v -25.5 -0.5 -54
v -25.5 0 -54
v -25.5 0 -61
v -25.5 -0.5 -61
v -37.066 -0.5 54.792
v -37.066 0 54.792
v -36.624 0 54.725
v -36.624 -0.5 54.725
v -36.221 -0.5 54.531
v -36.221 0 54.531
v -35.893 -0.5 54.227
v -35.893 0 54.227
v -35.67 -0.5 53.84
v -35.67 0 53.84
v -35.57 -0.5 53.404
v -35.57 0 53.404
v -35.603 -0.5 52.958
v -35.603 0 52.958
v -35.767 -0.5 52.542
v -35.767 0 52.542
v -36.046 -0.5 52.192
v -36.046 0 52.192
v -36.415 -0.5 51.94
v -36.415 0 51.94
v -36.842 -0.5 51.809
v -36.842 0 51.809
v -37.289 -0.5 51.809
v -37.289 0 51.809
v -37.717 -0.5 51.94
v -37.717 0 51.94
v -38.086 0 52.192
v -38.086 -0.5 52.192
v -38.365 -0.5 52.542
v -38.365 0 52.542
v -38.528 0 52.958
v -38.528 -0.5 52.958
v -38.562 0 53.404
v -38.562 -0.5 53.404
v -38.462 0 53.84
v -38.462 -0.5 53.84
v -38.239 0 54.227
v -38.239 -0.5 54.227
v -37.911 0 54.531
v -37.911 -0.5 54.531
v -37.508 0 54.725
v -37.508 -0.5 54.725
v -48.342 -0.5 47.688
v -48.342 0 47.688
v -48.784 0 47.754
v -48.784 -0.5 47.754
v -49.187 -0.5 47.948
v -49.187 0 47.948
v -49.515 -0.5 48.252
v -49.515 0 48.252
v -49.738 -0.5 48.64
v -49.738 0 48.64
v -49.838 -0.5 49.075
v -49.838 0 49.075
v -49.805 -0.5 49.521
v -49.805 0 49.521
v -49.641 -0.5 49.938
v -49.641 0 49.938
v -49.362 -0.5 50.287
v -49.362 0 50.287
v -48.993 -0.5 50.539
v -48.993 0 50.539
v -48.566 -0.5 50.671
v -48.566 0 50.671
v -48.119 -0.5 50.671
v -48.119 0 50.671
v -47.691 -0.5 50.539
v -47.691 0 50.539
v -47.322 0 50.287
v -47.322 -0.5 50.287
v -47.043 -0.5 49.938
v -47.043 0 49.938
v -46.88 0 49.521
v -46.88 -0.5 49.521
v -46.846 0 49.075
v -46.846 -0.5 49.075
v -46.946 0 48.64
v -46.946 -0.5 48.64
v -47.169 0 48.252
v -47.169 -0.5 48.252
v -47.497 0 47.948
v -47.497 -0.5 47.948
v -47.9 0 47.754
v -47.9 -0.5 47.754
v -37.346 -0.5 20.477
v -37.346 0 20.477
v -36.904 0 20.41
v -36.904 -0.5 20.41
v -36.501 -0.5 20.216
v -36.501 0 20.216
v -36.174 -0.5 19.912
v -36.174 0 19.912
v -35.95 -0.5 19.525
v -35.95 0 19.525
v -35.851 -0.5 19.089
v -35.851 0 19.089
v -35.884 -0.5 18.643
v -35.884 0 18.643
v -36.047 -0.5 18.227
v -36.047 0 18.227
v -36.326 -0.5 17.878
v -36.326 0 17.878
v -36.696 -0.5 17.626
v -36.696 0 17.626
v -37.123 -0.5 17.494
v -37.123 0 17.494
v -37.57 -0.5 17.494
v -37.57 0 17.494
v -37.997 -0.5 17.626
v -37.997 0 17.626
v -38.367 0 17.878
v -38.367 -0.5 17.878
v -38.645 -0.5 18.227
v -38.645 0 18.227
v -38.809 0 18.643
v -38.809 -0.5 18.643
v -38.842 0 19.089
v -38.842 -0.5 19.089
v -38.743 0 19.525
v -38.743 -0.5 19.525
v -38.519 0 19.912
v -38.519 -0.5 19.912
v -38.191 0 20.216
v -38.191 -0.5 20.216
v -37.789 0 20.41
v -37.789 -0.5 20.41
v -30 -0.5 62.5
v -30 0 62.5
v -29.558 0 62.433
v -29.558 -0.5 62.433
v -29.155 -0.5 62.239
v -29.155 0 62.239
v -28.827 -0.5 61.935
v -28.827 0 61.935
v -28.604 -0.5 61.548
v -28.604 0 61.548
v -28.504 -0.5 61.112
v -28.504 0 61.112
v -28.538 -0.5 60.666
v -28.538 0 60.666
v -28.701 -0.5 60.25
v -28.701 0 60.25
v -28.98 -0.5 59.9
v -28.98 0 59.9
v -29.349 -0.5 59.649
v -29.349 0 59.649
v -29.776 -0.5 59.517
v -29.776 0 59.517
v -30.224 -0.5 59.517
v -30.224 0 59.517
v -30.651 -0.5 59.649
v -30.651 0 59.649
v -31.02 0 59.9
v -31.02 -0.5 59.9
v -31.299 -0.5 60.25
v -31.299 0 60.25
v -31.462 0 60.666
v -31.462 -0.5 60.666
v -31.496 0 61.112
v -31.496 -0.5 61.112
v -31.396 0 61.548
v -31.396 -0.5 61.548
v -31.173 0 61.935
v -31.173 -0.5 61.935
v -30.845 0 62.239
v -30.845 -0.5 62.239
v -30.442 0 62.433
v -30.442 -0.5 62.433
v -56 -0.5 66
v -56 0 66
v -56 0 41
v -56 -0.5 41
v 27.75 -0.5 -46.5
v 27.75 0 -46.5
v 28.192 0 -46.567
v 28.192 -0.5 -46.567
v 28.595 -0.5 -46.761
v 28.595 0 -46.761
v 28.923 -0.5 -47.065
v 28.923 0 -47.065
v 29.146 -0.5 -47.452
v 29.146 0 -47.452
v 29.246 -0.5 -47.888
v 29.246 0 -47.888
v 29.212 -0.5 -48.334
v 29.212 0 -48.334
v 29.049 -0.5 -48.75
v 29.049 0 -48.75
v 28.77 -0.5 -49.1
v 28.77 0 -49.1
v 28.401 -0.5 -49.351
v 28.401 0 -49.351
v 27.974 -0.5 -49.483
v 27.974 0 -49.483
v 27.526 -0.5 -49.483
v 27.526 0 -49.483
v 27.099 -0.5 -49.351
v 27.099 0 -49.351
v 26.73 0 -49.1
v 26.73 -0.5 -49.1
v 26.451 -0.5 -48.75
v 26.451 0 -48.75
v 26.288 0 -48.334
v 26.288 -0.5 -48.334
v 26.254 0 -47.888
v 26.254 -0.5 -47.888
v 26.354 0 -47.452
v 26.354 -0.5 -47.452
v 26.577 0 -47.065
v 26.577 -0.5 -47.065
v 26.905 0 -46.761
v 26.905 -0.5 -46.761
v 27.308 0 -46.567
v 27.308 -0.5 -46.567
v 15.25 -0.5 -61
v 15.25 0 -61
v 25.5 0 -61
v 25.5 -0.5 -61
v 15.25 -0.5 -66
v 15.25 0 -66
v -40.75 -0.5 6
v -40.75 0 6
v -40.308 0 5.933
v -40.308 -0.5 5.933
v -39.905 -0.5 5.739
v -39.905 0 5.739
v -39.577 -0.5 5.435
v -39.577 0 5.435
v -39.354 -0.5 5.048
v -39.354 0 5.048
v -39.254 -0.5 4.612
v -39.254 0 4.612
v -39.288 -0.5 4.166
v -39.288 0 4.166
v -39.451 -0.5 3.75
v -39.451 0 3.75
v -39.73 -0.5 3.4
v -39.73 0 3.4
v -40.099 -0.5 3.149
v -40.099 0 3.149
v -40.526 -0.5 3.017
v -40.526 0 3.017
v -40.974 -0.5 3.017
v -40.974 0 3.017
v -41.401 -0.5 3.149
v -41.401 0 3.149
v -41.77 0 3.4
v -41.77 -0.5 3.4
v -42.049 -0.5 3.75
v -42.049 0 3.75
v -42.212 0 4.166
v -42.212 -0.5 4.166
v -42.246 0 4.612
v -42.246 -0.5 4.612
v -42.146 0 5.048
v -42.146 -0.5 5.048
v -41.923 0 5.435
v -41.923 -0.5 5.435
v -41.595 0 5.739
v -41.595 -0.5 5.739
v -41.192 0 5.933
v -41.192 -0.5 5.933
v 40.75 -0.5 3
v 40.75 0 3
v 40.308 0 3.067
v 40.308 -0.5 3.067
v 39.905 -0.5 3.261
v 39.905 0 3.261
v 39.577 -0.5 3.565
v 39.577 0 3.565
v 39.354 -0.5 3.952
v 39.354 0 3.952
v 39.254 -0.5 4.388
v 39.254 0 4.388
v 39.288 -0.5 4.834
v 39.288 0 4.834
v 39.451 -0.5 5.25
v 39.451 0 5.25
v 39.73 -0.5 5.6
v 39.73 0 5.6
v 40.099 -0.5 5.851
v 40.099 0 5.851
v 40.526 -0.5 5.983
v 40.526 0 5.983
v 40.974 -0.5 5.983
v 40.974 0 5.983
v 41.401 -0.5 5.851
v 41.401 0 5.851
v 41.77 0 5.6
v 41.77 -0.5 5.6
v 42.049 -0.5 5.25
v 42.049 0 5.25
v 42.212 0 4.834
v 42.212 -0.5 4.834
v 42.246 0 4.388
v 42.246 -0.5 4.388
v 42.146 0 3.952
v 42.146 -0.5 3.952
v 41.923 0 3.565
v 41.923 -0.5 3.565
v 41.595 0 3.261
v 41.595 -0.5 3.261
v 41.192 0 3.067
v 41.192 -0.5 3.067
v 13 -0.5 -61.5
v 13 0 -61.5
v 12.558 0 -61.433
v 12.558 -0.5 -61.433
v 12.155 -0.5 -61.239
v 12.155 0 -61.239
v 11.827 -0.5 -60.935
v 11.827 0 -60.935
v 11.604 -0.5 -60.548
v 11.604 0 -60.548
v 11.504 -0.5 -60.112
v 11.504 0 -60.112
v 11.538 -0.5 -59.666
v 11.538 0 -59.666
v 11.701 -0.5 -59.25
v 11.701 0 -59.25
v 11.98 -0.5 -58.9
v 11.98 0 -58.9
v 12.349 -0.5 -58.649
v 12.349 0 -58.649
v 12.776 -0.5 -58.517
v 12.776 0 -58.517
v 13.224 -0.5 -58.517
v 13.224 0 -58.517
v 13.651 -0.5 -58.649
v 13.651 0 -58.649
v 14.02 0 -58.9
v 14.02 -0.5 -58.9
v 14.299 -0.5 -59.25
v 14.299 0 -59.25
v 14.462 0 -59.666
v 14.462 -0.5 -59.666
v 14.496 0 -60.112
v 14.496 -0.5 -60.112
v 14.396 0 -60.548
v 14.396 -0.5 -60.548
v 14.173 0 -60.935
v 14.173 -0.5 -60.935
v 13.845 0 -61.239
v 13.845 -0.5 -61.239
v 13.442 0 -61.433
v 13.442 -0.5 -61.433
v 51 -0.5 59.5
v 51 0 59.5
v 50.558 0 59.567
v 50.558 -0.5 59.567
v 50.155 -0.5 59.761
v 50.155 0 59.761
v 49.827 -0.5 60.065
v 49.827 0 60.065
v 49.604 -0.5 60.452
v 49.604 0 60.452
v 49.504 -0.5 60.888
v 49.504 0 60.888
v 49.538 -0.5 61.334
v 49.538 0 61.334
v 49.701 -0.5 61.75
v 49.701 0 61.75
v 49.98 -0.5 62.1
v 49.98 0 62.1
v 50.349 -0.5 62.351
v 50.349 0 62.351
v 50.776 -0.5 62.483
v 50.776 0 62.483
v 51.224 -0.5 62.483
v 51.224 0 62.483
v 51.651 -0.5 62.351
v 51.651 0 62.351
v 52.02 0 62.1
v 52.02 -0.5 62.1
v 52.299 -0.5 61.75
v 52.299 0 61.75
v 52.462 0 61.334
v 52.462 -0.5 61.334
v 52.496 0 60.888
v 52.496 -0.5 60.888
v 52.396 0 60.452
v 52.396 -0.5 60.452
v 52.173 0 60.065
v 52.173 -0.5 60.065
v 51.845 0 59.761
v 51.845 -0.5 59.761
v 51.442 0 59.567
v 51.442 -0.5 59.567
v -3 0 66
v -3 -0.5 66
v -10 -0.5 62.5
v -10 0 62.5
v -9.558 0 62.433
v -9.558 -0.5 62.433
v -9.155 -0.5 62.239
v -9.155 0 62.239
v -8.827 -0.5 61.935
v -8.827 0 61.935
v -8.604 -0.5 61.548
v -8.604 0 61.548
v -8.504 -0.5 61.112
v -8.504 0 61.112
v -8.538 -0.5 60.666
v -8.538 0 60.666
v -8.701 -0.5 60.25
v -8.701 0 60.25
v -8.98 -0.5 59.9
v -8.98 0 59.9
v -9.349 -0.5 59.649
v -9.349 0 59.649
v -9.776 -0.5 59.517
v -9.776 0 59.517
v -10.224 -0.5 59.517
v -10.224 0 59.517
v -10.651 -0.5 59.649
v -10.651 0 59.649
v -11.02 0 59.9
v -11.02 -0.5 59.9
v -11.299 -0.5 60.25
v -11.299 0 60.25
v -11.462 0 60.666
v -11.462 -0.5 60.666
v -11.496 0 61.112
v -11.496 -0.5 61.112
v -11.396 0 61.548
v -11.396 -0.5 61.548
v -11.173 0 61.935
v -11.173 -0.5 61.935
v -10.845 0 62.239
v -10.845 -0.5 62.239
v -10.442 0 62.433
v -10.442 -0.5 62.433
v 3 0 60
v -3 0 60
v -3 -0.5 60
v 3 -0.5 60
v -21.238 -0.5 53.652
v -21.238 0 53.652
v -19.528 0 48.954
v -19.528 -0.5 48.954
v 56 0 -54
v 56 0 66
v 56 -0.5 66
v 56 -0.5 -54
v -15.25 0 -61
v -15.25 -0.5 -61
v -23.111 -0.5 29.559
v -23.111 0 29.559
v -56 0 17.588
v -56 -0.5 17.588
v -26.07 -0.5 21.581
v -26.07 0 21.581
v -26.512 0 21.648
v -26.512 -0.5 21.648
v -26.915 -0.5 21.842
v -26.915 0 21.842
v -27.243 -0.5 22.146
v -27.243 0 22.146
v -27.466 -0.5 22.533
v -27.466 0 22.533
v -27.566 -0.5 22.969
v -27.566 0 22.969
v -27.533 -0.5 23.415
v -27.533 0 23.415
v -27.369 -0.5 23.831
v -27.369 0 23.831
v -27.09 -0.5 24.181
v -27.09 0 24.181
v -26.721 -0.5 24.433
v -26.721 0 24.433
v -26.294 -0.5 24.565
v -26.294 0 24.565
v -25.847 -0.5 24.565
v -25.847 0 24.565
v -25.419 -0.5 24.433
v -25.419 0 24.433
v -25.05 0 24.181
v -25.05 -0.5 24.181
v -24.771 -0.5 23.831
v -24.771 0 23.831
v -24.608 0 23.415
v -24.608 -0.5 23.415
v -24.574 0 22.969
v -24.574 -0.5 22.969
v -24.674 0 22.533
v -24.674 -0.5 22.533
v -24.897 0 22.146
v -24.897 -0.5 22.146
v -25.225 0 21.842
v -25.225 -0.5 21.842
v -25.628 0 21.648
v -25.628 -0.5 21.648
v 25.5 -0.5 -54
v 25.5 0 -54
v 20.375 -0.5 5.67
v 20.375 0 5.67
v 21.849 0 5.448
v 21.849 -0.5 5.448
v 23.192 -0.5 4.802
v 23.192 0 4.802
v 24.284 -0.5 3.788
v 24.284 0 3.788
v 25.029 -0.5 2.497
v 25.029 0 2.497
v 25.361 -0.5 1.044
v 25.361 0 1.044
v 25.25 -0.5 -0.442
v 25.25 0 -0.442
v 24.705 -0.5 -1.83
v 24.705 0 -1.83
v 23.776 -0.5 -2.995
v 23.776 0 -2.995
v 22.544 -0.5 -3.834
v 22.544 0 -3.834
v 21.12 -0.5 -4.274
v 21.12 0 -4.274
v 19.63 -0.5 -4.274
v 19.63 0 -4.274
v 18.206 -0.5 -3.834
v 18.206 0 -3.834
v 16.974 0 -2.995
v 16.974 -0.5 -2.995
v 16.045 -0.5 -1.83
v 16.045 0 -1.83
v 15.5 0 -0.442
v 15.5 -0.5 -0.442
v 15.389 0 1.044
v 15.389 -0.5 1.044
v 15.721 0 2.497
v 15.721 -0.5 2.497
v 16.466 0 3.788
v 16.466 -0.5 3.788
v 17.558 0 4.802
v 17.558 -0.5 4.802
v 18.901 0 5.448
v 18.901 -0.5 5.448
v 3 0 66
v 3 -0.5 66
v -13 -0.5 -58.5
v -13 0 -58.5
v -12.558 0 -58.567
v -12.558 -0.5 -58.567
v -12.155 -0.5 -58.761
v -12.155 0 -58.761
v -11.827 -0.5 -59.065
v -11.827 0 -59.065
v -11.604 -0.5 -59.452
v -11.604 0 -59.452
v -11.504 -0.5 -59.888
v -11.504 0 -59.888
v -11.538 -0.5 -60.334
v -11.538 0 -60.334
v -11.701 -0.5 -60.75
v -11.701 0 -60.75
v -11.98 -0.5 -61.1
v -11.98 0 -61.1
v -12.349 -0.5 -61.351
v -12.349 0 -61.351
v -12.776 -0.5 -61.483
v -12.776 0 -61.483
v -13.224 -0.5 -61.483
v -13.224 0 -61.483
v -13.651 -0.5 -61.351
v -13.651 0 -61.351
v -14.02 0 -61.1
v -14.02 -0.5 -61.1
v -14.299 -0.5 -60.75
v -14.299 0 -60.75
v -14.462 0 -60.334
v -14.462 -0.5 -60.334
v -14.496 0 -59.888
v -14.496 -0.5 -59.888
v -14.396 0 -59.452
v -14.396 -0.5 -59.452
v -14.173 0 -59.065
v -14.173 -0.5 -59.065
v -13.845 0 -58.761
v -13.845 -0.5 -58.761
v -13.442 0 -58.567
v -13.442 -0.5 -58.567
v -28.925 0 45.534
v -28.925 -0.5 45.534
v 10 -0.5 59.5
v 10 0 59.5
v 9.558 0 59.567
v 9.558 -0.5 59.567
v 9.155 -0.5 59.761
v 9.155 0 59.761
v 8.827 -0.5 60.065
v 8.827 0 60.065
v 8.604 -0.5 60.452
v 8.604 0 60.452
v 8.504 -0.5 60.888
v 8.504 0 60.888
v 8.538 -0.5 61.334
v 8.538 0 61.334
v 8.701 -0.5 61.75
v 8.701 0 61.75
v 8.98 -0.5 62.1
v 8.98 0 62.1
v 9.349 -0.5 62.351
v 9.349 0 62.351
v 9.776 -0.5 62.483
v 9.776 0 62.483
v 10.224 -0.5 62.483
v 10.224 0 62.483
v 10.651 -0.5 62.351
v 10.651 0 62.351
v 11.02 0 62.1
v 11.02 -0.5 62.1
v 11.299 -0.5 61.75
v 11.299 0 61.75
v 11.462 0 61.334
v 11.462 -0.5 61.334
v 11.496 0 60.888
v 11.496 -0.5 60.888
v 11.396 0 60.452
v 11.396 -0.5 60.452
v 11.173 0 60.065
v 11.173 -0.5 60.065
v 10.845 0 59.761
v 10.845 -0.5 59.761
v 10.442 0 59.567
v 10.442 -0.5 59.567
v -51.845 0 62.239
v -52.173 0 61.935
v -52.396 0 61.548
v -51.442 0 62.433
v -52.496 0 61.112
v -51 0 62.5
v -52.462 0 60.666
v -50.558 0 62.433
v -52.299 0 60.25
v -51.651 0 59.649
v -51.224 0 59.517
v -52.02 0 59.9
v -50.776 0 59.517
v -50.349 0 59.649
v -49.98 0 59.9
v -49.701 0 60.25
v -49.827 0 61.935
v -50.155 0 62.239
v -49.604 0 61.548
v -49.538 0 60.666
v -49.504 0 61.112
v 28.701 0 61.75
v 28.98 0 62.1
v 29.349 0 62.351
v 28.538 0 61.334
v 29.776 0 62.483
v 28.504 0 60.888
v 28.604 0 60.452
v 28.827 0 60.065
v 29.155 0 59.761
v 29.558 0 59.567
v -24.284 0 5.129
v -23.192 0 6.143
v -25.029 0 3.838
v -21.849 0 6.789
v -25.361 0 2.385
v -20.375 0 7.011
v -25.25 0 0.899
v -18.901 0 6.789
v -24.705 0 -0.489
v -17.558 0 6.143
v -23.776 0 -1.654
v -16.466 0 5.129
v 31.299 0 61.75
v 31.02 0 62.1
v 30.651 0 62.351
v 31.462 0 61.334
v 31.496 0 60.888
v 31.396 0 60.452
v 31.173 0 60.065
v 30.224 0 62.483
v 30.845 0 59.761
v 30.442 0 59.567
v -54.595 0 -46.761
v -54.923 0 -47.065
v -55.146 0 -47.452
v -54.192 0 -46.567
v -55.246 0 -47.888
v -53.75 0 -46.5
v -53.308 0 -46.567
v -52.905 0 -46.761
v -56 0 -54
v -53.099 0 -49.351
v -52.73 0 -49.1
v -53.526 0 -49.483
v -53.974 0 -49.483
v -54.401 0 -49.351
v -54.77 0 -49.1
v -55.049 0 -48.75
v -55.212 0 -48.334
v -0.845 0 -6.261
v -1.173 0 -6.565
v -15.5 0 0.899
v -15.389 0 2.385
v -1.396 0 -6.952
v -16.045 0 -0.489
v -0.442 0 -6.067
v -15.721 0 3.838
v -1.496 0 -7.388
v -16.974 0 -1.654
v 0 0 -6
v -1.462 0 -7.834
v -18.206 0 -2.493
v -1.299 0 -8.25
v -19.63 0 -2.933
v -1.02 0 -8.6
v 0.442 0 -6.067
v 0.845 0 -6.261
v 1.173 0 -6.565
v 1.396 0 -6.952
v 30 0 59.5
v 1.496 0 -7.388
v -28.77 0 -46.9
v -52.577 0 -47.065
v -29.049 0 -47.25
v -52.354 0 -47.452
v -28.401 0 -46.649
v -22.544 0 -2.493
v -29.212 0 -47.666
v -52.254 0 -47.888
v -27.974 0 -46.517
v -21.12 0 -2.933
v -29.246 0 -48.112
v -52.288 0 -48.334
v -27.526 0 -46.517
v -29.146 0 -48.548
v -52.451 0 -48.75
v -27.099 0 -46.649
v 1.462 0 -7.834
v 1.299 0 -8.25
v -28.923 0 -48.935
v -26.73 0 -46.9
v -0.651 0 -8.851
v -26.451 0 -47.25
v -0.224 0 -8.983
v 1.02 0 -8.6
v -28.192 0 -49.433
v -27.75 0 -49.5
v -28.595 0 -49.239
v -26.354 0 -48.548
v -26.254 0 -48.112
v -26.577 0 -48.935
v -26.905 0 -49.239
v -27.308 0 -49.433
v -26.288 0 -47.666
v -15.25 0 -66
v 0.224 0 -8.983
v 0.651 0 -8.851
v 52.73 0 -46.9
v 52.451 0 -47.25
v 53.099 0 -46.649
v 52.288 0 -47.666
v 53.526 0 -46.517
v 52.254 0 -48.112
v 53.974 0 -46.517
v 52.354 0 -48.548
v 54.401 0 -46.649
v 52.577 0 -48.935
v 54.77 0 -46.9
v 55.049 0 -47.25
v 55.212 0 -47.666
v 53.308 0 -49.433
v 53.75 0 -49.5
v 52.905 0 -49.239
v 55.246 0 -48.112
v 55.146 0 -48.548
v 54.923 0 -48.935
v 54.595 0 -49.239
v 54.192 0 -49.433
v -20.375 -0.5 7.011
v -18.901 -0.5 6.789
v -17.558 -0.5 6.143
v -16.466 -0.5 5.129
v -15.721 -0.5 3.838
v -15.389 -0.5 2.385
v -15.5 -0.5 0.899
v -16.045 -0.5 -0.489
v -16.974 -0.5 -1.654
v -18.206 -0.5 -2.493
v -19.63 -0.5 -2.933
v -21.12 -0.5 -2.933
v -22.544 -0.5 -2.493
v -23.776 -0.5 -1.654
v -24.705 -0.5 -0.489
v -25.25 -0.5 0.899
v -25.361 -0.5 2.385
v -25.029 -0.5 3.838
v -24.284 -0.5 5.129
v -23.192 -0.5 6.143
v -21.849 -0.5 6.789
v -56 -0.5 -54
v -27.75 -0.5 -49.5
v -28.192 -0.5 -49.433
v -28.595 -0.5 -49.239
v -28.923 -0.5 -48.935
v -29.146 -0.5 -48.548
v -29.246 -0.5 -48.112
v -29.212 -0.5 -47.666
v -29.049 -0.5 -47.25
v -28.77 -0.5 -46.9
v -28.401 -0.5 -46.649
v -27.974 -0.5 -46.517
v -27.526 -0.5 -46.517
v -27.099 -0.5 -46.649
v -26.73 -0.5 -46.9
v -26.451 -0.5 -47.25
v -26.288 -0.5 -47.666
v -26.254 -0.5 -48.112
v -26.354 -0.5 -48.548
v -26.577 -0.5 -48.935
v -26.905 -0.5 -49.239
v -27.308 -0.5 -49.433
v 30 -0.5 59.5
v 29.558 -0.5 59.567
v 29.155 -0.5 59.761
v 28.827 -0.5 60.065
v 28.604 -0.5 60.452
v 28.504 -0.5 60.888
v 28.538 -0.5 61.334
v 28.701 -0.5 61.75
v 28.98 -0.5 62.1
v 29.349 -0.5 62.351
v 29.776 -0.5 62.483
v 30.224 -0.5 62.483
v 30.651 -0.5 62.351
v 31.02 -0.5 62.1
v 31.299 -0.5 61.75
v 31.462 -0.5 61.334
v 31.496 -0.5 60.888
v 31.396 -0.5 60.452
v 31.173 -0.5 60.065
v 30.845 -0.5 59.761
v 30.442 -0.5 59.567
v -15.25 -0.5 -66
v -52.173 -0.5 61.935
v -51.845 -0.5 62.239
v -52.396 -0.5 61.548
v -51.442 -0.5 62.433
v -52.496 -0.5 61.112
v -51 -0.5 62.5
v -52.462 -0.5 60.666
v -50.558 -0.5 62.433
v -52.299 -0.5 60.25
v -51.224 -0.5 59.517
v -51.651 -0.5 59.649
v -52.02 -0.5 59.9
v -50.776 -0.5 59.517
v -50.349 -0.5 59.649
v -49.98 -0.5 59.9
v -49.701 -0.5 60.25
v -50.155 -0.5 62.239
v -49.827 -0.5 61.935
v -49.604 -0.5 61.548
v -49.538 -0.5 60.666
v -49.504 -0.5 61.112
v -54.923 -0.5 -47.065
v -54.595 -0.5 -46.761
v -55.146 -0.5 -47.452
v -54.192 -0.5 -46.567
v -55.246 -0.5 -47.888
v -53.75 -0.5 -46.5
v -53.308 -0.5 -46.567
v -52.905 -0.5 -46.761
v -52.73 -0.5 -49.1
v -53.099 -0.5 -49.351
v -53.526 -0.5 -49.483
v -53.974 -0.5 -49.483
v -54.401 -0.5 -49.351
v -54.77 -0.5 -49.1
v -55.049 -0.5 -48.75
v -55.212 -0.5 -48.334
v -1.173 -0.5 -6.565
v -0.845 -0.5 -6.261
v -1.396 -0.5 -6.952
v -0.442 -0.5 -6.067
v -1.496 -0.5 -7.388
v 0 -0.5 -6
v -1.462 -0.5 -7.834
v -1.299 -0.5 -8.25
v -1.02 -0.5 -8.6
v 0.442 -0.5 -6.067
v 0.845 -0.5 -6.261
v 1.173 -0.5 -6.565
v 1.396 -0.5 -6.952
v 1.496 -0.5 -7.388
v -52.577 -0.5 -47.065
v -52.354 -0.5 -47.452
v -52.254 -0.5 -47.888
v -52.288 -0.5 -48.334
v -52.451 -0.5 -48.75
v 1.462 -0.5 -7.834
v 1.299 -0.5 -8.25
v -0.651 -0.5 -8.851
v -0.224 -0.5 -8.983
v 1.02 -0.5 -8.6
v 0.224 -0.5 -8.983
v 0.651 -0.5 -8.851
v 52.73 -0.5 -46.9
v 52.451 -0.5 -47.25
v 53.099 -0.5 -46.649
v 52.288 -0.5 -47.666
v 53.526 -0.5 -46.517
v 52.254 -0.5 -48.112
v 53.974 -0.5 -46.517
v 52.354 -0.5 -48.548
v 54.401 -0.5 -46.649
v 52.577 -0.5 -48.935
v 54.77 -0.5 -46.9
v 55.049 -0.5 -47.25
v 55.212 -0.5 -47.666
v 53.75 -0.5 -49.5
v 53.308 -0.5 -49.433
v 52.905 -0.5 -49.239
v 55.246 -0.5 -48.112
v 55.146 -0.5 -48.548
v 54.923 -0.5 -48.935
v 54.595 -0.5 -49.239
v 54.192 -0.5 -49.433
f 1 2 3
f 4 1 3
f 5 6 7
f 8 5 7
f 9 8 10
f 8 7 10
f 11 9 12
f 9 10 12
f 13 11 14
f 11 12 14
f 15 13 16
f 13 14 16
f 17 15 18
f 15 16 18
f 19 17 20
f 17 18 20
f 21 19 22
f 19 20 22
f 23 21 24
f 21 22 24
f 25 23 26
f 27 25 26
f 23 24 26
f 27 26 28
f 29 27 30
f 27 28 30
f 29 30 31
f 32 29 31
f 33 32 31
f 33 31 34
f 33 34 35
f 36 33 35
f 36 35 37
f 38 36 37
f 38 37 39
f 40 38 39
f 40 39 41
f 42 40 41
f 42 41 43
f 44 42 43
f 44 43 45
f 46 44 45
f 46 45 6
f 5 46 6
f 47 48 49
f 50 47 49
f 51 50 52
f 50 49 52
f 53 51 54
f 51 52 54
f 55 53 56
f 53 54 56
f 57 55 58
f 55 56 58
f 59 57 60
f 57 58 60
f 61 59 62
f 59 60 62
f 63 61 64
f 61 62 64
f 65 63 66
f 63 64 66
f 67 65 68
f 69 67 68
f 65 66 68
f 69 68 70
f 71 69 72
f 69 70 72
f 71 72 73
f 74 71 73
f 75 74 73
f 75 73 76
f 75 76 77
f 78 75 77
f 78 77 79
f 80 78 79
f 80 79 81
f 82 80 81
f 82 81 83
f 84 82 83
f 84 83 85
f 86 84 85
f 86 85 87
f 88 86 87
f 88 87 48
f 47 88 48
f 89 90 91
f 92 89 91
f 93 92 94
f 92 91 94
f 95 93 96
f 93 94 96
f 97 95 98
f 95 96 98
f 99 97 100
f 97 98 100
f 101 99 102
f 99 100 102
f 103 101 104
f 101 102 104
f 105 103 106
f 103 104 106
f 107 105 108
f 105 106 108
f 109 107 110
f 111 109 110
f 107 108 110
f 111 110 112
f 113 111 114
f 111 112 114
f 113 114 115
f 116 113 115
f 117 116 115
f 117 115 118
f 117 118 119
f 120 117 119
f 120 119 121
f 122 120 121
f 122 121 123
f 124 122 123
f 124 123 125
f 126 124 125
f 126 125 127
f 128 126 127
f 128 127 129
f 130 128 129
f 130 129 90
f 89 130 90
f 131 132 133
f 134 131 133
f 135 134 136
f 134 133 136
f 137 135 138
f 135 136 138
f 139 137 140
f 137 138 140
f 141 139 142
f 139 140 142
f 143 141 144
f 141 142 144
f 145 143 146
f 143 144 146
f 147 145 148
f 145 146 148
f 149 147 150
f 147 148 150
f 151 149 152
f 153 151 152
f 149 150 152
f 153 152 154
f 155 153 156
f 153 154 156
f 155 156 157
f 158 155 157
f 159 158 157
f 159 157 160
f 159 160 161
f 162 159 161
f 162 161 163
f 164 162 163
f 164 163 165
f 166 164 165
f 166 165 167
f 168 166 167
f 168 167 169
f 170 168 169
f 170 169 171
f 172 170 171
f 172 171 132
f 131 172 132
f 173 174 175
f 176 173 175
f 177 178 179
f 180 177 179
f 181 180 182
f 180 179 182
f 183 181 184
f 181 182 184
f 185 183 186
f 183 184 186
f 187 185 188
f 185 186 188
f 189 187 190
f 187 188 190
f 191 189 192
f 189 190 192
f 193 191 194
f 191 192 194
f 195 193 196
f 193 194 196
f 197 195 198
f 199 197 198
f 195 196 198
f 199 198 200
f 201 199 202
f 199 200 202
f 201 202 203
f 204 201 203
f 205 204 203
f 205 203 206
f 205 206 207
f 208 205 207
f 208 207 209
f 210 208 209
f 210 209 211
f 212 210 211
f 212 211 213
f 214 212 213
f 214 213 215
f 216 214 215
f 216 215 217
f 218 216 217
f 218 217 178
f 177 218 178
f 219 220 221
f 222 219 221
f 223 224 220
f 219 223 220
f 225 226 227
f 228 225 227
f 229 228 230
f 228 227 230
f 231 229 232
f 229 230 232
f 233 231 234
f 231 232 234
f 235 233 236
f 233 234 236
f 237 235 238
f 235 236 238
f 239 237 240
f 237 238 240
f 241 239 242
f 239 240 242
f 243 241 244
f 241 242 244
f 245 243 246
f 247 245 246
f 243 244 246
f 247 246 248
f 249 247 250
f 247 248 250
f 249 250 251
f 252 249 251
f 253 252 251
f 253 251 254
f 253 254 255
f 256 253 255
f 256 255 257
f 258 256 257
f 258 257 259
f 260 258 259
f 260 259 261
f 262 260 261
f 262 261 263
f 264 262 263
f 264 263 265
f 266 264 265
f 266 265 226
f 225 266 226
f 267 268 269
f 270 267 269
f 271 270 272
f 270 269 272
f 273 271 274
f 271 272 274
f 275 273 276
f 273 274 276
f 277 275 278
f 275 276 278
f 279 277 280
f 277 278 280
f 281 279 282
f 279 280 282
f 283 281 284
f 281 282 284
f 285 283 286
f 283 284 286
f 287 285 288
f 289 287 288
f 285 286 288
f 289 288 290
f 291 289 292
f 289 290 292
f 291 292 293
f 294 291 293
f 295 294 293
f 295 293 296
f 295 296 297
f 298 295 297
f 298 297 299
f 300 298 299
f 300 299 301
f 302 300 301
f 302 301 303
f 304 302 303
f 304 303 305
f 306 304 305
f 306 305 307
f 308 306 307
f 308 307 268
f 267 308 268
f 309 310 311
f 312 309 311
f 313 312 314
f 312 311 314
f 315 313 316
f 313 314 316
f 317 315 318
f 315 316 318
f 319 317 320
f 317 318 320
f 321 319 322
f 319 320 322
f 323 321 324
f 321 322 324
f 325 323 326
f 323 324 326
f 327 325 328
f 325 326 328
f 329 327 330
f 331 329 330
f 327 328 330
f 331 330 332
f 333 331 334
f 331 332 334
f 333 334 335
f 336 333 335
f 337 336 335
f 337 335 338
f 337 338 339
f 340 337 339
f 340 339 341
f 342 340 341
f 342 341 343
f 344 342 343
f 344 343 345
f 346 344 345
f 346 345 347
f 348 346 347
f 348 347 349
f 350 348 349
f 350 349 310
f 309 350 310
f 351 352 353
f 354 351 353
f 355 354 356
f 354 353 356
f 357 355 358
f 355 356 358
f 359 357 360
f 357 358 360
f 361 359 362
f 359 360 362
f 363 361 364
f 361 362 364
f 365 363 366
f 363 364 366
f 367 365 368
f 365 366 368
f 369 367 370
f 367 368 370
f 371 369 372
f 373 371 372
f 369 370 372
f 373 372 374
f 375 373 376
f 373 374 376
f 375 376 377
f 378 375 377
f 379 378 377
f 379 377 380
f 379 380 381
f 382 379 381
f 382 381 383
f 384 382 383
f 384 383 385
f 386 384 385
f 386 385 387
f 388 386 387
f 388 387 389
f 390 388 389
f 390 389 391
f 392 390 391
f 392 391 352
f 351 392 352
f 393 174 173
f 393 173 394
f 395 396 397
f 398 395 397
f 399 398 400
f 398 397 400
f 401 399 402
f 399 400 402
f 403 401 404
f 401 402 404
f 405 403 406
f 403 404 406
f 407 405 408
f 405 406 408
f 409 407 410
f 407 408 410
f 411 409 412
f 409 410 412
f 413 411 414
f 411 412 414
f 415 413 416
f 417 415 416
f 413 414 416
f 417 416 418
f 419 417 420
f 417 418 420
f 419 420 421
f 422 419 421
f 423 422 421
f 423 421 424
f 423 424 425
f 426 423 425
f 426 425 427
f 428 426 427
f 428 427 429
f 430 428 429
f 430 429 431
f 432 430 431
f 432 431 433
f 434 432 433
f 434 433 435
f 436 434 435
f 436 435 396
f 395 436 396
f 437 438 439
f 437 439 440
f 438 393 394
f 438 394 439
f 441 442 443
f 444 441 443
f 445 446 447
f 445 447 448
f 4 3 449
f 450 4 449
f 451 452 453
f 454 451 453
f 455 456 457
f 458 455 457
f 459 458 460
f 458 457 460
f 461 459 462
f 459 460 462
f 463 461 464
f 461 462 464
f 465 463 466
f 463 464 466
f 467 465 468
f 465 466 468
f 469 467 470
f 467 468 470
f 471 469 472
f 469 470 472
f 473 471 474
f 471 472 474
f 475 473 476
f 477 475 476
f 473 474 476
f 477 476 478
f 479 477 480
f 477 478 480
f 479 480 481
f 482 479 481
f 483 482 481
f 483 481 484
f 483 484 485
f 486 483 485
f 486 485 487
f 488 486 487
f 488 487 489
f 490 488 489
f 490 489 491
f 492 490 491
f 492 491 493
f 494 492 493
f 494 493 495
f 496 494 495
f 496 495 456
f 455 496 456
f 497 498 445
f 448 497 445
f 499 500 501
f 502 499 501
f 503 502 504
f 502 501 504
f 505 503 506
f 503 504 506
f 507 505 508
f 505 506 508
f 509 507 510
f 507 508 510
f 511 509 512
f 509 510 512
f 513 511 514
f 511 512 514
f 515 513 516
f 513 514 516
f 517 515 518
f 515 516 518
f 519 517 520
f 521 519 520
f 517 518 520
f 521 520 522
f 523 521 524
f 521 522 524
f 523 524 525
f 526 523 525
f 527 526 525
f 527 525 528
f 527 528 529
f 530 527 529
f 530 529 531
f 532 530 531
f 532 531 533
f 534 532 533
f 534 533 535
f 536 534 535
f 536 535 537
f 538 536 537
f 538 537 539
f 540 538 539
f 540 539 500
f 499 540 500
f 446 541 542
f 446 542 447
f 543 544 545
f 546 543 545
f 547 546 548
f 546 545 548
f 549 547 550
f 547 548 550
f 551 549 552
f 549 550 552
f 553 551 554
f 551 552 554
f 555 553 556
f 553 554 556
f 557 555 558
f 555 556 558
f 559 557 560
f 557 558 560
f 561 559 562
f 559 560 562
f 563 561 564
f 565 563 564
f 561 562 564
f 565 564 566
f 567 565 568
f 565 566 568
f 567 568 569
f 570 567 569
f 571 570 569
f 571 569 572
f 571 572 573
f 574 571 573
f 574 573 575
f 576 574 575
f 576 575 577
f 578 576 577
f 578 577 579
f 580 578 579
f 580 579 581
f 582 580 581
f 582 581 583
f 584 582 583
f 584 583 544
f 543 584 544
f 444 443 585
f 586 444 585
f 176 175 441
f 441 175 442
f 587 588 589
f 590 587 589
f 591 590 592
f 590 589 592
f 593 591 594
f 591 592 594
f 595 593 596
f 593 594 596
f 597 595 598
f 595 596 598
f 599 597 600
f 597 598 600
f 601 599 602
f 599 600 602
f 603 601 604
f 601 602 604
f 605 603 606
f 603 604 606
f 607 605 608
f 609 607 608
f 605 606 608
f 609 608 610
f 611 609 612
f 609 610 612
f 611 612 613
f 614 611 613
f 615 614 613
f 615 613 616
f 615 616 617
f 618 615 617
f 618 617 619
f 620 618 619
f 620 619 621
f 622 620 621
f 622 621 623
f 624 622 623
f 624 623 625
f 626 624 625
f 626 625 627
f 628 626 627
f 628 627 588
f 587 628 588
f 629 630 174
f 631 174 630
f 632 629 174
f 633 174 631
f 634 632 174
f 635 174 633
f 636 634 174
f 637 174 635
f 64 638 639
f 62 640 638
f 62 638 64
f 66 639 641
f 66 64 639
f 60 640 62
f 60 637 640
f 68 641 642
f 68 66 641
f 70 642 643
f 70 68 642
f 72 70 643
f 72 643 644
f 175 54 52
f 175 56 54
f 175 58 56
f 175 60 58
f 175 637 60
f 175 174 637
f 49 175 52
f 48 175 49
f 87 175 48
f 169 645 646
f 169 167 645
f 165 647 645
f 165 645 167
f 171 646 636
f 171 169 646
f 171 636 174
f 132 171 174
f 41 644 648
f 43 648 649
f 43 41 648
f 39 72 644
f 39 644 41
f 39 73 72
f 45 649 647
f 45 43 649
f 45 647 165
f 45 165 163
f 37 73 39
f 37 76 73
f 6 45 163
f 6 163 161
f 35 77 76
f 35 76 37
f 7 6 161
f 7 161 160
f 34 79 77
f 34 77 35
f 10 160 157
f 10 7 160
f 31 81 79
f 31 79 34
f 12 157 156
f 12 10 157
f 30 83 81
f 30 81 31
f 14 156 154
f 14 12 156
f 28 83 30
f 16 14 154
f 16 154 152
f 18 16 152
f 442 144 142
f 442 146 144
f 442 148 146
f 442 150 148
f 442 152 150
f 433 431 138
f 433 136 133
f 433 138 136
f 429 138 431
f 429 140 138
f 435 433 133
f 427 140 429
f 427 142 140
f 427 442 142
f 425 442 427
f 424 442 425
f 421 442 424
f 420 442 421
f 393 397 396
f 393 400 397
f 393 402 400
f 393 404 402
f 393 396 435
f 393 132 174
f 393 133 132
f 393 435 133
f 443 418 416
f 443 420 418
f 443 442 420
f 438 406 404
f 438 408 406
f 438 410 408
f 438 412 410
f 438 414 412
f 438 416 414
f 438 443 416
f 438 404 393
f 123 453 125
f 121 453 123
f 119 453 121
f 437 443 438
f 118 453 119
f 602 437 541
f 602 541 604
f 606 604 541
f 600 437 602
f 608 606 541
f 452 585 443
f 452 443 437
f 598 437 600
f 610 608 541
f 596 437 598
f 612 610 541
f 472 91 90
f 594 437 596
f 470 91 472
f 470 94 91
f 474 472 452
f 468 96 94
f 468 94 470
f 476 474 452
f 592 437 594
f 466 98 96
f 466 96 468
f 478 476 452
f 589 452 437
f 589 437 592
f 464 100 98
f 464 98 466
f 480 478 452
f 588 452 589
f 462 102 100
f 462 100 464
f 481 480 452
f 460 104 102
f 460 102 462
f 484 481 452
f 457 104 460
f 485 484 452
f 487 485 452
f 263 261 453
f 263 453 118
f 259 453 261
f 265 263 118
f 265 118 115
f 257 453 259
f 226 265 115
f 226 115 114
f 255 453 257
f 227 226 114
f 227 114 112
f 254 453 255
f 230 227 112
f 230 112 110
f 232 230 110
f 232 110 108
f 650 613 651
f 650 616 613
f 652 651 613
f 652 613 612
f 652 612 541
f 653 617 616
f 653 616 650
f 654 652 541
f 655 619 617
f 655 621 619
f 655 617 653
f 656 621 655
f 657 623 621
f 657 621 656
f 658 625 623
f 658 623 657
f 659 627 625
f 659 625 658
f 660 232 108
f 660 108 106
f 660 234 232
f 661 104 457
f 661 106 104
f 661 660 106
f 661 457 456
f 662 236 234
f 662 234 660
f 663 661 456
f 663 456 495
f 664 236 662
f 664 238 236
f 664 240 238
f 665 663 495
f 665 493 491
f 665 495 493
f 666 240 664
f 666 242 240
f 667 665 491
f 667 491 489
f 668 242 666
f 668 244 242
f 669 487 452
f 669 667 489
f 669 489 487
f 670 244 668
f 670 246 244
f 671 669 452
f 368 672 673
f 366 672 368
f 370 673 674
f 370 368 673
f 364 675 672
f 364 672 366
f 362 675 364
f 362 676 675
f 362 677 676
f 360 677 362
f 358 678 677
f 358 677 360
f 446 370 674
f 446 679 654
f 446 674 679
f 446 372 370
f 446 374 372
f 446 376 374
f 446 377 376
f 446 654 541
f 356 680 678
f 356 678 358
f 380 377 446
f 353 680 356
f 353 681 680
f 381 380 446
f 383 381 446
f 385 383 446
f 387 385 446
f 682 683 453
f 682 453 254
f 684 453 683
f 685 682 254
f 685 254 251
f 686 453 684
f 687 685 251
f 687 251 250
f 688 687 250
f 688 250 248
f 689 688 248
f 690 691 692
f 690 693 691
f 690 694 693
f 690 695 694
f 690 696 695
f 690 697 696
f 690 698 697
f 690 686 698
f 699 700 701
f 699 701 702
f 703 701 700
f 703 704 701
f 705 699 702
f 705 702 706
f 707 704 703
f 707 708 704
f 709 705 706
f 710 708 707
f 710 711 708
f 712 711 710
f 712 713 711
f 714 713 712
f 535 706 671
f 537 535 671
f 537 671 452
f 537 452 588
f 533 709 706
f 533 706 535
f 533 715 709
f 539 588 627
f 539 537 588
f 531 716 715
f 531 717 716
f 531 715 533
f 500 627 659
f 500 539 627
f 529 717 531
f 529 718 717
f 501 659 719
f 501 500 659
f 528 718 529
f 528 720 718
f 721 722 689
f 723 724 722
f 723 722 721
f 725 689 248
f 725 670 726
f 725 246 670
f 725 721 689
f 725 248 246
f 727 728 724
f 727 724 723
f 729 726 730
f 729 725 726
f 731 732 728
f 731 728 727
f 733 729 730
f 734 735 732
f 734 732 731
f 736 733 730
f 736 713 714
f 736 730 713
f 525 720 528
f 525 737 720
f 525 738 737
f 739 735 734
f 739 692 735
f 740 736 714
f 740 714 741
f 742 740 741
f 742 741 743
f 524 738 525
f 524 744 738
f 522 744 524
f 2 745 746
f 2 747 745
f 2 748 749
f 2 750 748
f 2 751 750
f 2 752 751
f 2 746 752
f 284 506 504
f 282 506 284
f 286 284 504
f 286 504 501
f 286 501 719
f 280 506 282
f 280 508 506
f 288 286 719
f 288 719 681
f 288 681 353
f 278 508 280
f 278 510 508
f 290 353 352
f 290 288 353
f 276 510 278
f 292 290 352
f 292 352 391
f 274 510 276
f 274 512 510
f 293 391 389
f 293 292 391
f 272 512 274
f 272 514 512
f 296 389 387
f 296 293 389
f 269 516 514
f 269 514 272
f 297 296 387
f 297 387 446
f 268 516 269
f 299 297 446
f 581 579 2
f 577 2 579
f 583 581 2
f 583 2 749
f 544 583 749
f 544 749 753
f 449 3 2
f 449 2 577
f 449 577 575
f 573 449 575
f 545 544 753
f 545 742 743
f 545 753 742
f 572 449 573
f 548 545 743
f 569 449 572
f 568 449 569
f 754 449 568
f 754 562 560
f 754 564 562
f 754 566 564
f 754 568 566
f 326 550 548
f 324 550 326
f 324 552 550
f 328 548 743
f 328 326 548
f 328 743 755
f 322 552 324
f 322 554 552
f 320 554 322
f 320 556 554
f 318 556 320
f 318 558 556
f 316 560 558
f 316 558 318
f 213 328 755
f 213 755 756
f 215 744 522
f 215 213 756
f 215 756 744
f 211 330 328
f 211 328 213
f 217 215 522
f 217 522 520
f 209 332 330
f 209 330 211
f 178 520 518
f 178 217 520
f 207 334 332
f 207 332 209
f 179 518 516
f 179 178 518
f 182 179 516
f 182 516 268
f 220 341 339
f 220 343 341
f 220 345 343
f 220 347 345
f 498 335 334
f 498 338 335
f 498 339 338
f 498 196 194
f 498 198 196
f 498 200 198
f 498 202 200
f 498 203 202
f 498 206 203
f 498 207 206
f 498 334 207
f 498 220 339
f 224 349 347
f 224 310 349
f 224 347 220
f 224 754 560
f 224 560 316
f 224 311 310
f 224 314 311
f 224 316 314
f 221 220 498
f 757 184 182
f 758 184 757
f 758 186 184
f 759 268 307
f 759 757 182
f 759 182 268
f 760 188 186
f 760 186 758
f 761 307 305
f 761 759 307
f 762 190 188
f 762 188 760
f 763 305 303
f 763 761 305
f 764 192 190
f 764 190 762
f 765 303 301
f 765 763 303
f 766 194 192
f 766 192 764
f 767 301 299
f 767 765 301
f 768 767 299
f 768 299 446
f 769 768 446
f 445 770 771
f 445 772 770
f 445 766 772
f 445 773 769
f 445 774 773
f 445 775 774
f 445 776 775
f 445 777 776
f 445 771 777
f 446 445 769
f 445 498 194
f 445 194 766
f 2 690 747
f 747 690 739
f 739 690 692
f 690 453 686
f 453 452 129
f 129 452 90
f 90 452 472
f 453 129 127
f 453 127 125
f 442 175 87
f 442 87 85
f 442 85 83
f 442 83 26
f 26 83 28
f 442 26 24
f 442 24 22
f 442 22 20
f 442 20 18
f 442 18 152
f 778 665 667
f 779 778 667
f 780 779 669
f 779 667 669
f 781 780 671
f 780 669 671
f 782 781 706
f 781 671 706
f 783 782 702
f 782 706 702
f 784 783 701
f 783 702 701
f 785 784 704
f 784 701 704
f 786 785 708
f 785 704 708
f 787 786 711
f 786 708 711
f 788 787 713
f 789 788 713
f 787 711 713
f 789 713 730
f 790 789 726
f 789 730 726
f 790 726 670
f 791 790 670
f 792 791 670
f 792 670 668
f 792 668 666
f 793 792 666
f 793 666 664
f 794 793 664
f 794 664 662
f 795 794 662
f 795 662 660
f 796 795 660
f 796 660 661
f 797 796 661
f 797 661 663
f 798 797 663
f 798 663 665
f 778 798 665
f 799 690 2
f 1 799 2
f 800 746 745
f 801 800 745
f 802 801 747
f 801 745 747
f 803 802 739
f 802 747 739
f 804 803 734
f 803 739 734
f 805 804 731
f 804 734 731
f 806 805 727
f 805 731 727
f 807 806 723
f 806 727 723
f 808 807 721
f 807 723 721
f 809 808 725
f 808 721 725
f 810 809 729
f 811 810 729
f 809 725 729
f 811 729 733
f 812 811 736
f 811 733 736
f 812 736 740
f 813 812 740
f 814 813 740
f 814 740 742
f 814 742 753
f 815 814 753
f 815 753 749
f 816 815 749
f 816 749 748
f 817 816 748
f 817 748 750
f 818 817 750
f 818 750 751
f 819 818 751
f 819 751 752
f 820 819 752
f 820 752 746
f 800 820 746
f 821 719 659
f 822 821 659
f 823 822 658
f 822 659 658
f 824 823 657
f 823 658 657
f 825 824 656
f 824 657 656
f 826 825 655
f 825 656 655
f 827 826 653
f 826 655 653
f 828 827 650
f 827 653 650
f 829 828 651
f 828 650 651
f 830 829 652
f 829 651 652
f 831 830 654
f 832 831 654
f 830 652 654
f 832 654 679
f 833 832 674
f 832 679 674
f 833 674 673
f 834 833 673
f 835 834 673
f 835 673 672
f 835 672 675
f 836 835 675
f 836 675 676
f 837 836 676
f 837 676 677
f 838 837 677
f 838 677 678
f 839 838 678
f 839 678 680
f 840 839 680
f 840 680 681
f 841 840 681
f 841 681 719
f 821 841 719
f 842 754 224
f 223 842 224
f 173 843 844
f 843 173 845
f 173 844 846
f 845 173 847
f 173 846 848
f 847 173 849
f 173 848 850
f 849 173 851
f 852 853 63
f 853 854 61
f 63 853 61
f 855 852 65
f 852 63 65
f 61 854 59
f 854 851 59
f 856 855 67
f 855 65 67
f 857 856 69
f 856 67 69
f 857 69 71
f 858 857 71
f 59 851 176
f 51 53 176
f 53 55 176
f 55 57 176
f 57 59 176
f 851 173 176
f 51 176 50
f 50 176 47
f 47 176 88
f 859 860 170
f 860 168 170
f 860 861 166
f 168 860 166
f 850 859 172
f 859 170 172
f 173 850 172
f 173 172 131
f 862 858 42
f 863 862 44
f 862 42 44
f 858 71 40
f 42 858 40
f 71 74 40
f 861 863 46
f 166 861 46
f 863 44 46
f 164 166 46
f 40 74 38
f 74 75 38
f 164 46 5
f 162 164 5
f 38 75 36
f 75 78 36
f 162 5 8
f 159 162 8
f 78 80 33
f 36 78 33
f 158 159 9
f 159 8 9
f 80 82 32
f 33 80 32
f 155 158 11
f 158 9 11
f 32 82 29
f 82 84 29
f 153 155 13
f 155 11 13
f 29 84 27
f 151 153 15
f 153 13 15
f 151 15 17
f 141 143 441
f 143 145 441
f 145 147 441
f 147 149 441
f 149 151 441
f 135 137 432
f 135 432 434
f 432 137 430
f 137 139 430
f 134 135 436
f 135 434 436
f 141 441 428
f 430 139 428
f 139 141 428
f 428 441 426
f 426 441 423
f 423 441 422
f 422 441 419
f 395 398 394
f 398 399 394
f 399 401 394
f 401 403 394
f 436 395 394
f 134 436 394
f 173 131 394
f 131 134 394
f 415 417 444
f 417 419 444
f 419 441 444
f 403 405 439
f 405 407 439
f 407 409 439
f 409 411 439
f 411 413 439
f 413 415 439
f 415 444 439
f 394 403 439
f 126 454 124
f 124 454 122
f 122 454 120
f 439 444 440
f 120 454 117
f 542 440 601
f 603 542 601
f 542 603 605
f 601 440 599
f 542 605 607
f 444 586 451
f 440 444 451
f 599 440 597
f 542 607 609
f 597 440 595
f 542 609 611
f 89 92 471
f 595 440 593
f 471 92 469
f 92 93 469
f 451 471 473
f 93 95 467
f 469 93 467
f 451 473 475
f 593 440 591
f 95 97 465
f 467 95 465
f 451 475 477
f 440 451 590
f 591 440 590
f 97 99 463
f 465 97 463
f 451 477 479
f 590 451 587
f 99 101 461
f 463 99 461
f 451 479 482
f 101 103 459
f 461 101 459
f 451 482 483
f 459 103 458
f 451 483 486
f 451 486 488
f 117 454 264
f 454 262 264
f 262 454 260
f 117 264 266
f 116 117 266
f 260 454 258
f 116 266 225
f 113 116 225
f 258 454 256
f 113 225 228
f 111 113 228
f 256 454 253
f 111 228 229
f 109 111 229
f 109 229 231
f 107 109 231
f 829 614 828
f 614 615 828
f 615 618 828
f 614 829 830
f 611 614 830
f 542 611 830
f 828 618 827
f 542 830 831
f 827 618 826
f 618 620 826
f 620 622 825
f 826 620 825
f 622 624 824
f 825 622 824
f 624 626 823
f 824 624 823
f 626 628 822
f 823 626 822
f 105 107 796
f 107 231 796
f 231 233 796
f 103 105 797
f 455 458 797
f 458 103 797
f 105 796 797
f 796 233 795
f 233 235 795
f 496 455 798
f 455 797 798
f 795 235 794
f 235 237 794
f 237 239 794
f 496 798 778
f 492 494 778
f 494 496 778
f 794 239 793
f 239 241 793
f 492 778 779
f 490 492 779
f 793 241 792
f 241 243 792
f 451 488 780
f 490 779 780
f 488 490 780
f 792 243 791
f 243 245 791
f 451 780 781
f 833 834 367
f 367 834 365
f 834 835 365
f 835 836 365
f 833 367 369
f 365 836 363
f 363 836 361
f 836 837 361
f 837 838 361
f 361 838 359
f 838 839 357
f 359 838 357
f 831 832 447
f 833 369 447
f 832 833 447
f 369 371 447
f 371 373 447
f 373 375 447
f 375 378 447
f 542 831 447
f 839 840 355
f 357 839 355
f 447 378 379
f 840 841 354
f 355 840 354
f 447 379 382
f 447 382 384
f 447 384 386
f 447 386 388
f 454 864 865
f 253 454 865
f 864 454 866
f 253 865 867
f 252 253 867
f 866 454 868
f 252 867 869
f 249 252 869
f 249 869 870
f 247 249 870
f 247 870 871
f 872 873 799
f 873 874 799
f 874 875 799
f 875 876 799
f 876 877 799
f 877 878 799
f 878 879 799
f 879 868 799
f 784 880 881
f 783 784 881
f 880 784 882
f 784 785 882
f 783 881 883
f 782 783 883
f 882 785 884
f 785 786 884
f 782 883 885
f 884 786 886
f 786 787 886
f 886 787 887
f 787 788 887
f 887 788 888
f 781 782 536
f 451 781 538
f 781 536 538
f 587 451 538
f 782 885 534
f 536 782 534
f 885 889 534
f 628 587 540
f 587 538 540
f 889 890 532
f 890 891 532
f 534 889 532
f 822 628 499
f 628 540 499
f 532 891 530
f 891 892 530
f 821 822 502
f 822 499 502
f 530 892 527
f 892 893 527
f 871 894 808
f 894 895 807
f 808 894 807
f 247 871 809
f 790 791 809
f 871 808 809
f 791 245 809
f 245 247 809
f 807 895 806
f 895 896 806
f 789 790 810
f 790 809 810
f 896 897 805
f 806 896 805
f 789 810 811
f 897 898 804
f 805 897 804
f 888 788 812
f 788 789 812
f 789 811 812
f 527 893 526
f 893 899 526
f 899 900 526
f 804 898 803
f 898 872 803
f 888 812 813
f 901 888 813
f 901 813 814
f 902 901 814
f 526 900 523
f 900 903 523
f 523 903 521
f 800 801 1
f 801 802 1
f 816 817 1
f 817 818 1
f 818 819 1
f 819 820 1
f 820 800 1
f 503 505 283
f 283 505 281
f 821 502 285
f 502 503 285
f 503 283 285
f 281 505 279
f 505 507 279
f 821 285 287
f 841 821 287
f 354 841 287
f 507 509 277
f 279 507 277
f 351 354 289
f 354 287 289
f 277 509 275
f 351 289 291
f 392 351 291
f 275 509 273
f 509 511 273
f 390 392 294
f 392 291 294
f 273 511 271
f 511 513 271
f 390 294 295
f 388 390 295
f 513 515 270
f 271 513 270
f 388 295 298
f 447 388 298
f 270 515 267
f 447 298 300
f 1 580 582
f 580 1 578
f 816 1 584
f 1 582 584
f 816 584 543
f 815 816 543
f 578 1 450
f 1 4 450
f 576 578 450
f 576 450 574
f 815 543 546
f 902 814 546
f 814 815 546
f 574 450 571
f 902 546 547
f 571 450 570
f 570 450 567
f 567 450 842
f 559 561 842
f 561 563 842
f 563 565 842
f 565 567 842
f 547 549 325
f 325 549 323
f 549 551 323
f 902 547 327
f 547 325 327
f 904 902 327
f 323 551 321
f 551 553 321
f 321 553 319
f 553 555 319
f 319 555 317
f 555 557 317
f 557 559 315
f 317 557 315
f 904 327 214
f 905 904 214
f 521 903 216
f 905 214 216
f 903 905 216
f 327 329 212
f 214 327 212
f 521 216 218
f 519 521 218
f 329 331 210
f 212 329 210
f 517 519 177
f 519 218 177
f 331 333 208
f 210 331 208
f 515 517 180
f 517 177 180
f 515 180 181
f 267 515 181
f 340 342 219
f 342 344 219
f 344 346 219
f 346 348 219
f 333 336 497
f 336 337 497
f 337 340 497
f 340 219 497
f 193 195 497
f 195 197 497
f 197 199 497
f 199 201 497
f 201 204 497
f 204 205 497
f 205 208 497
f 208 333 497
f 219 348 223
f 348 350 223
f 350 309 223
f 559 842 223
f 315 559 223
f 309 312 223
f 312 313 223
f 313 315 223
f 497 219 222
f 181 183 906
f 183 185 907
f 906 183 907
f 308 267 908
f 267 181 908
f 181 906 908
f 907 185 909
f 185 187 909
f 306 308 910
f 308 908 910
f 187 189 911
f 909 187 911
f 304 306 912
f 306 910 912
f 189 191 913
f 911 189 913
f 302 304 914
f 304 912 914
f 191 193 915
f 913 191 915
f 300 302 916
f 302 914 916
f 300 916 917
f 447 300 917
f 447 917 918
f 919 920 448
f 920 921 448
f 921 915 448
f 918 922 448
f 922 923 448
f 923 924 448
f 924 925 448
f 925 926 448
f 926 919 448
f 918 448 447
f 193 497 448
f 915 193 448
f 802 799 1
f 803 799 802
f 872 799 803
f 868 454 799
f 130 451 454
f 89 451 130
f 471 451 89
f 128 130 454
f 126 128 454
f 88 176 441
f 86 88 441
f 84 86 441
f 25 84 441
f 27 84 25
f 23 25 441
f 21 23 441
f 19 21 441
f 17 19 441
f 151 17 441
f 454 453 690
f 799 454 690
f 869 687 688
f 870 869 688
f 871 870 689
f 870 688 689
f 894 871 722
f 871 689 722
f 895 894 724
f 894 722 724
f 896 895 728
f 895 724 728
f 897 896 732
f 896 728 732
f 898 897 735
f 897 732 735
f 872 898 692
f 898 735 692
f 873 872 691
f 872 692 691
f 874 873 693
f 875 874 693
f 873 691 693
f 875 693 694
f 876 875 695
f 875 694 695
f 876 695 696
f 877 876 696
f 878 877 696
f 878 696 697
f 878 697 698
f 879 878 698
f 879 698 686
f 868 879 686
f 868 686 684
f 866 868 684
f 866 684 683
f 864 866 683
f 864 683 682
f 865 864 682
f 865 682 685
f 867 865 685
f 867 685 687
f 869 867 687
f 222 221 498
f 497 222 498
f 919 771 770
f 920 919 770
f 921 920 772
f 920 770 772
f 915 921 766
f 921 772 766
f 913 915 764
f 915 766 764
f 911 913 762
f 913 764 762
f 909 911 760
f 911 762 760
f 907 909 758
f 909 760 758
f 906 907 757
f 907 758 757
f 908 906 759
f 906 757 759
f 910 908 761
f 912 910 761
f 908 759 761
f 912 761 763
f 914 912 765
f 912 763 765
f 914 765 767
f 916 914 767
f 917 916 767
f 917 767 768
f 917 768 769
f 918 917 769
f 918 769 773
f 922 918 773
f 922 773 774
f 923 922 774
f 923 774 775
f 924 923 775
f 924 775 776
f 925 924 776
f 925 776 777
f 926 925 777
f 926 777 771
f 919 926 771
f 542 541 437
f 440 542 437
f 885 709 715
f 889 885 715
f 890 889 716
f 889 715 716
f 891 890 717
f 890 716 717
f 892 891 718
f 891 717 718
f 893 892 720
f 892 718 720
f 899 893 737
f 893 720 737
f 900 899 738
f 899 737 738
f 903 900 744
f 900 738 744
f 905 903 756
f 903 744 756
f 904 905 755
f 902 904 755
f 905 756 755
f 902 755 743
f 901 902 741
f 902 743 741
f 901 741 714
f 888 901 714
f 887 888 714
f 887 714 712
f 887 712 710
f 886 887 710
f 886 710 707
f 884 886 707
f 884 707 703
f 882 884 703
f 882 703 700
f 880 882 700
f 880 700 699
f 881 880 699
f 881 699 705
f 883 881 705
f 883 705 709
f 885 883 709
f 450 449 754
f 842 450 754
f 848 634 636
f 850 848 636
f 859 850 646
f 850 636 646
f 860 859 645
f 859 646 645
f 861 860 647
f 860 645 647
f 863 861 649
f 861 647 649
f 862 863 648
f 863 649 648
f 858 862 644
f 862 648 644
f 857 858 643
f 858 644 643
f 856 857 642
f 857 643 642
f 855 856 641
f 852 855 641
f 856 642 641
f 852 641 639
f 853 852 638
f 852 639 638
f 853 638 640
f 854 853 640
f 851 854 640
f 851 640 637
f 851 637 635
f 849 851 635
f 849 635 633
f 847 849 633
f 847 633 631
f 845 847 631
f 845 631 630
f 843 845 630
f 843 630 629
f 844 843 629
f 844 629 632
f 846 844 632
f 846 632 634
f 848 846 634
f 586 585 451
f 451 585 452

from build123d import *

# Parameters (mm, degrees)
CROQUIS1_W             = 112
CROQUIS1_H             = 132
BRIDA_BASE1_DEPTH      = 0.5
CORTAR_EXTRUIR4_DEPTH  = 10
CROQUIS7_R             = 1.5
CORTAR_EXTRUIR5_DEPTH  = 10
CORTAR_EXTRUIR6_DEPTH  = 10
CROQUIS9_R             = 1.5
CORTAR_EXTRUIR7_DEPTH  = 12
CROQUIS10_R            = 1.5
CORTAR_EXTRUIR8_DEPTH  = 10
CROQUIS11_R            = 1.5
CORTAR_EXTRUIR9_DEPTH  = 10
CROQUIS12_W            = 6
CROQUIS12_H            = 6
CORTAR_EXTRUIR10_DEPTH = 10
CROQUIS13_R            = 5
CORTAR_EXTRUIR11_DEPTH = 10


# Sheet-metal steps are written as plain solids
with BuildPart() as part:
    # Croquis1 → Brida base1 (new body)
    with BuildSketch(Plane(origin=(0, 0, 0), x_dir=(1, 0, 0), z_dir=(0, 1, 0))):
        Rectangle(CROQUIS1_W, CROQUIS1_H)
    extrude(amount=-BRIDA_BASE1_DEPTH)

    # Croquis5 → Cortar-Extruir4 (cut)
    with BuildSketch(Plane(origin=(0, 0, 0), x_dir=(1, 0, 0), z_dir=(0, 1, 0))):
        Polygon((-15.25, 61), (-15.25, 66), (-56, 66), (-56, 54), (-25.5, 54), (-25.5, 61), align=None)
        Polygon((56, 66), (15.25, 66), (15.25, 61), (25.5, 61), (25.5, 54), (56, 54), align=None)
    extrude(amount=-CORTAR_EXTRUIR4_DEPTH, mode=Mode.SUBTRACT)

    # Croquis7 → Cortar-Extruir5 (cut)
    with BuildSketch(Plane(origin=(0, 0, 0), x_dir=(1, 0, 0), z_dir=(0, 1, 0))):
        with Locations(Location((-40.75, -4.5, 0), (0, 0, 270))):
            Circle(CROQUIS7_R)
        with Locations(Location((40.75, -4.5, 0), (0, 0, 90))):
            Circle(CROQUIS7_R)
        with Locations(Location((0, 7.5, 0), (0, 0, 270))):
            Circle(CROQUIS7_R)
    extrude(amount=-CORTAR_EXTRUIR5_DEPTH, mode=Mode.SUBTRACT)

    # Croquis8 → Cortar-Extruir6 (cut)
    with BuildSketch(Plane(origin=(0, 0, 0), x_dir=(1, 0, 0), z_dir=(0, 1, 0))):
        Polygon((-56, -17.588089006), (-56, -41), (-21.238275218, -53.652233112), (-19.528174501, -48.953770009), (-28.925100709, -45.533568575), (-23.110758272, -29.558794022), align=None)
    extrude(amount=-CORTAR_EXTRUIR6_DEPTH, mode=Mode.SUBTRACT)

    # Croquis9 → Cortar-Extruir7 (cut)
    with BuildSketch(Plane(origin=(0, 0, 0), x_dir=(1, 0, 0), z_dir=(0, 1, 0))):
        with Locations(Location((-13, 60, 0), (0, 0, 270))):
            Circle(CROQUIS9_R)
        with Locations(Location((13, 60, 0), (0, 0, 90))):
            Circle(CROQUIS9_R)
        with Locations(Location((-53.75, 48, 0), (0, 0, 270))):
            Circle(CROQUIS9_R)
        with Locations(Location((-27.75, 48, 0), (0, 0, 90))):
            Circle(CROQUIS9_R)
        with Locations(Location((27.75, 48, 0), (0, 0, 270))):
            Circle(CROQUIS9_R)
        with Locations(Location((53.75, 48, 0), (0, 0, 90))):
            Circle(CROQUIS9_R)
    extrude(amount=-CORTAR_EXTRUIR7_DEPTH, mode=Mode.SUBTRACT)

    # Croquis10 → Cortar-Extruir8 (cut)
    with BuildSketch(Plane(origin=(0, 0, 0), x_dir=(1, 0, 0), z_dir=(0, 1, 0))):
        with Locations(Location((-37.346445111, -18.977085256, 0), (0, 0, 270))):
            Circle(CROQUIS10_R)
        with Locations(Location((-26.070133662, -23.081326976, 0), (0, 0, 90))):
            Circle(CROQUIS10_R)
        with Locations(Location((-37.065850057, -53.291809483, 0), (0, 0, 270))):
            Circle(CROQUIS10_R)
        with Locations(Location((-48.342161507, -49.187567763, 0), (0, 0, 90))):
            Circle(CROQUIS10_R)
    extrude(amount=-CORTAR_EXTRUIR8_DEPTH, mode=Mode.SUBTRACT)

    # Croquis11 → Cortar-Extruir9 (cut)
    with BuildSketch(Plane(origin=(0, 0, 0), x_dir=(1, 0, 0), z_dir=(0, 1, 0))):
        with Locations(Location((-10, -61, 0), (0, 0, 270))):
            Circle(CROQUIS11_R)
        with Locations(Location((-30, -61, 0), (0, 0, 270))):
            Circle(CROQUIS11_R)
        with Locations(Location((30, -61, 0), (0, 0, 90))):
            Circle(CROQUIS11_R)
        with Locations(Location((10, -61, 0), (0, 0, 90))):
            Circle(CROQUIS11_R)
        with Locations(Location((-51, -61, 0), (0, 0, 270))):
            Circle(CROQUIS11_R)
        with Locations(Location((51, -61, 0), (0, 0, 90))):
            Circle(CROQUIS11_R)
    extrude(amount=-CORTAR_EXTRUIR9_DEPTH, mode=Mode.SUBTRACT)

    # Croquis12 → Cortar-Extruir10 (cut)
    with BuildSketch(Plane(origin=(0, 0, 0), x_dir=(1, 0, 0), z_dir=(0, 1, 0))):
        with Locations((0, -63)):
            Rectangle(CROQUIS12_W, CROQUIS12_H)
    extrude(amount=-CORTAR_EXTRUIR10_DEPTH, mode=Mode.SUBTRACT)

    # Croquis13 → Cortar-Extruir11 (cut)
    with BuildSketch(Plane(origin=(0, 0, 0), x_dir=(1, 0, 0), z_dir=(0, 1, 0))):
        with Locations(Location((-20.375, -2.011448093, 0), (0, 0, 270))):
            Circle(CROQUIS13_R)
        with Locations(Location((20.375, -0.670482698, 0), (0, 0, 270))):
            Circle(CROQUIS13_R)
    extrude(amount=-CORTAR_EXTRUIR11_DEPTH, mode=Mode.SUBTRACT)


solid = part.part
